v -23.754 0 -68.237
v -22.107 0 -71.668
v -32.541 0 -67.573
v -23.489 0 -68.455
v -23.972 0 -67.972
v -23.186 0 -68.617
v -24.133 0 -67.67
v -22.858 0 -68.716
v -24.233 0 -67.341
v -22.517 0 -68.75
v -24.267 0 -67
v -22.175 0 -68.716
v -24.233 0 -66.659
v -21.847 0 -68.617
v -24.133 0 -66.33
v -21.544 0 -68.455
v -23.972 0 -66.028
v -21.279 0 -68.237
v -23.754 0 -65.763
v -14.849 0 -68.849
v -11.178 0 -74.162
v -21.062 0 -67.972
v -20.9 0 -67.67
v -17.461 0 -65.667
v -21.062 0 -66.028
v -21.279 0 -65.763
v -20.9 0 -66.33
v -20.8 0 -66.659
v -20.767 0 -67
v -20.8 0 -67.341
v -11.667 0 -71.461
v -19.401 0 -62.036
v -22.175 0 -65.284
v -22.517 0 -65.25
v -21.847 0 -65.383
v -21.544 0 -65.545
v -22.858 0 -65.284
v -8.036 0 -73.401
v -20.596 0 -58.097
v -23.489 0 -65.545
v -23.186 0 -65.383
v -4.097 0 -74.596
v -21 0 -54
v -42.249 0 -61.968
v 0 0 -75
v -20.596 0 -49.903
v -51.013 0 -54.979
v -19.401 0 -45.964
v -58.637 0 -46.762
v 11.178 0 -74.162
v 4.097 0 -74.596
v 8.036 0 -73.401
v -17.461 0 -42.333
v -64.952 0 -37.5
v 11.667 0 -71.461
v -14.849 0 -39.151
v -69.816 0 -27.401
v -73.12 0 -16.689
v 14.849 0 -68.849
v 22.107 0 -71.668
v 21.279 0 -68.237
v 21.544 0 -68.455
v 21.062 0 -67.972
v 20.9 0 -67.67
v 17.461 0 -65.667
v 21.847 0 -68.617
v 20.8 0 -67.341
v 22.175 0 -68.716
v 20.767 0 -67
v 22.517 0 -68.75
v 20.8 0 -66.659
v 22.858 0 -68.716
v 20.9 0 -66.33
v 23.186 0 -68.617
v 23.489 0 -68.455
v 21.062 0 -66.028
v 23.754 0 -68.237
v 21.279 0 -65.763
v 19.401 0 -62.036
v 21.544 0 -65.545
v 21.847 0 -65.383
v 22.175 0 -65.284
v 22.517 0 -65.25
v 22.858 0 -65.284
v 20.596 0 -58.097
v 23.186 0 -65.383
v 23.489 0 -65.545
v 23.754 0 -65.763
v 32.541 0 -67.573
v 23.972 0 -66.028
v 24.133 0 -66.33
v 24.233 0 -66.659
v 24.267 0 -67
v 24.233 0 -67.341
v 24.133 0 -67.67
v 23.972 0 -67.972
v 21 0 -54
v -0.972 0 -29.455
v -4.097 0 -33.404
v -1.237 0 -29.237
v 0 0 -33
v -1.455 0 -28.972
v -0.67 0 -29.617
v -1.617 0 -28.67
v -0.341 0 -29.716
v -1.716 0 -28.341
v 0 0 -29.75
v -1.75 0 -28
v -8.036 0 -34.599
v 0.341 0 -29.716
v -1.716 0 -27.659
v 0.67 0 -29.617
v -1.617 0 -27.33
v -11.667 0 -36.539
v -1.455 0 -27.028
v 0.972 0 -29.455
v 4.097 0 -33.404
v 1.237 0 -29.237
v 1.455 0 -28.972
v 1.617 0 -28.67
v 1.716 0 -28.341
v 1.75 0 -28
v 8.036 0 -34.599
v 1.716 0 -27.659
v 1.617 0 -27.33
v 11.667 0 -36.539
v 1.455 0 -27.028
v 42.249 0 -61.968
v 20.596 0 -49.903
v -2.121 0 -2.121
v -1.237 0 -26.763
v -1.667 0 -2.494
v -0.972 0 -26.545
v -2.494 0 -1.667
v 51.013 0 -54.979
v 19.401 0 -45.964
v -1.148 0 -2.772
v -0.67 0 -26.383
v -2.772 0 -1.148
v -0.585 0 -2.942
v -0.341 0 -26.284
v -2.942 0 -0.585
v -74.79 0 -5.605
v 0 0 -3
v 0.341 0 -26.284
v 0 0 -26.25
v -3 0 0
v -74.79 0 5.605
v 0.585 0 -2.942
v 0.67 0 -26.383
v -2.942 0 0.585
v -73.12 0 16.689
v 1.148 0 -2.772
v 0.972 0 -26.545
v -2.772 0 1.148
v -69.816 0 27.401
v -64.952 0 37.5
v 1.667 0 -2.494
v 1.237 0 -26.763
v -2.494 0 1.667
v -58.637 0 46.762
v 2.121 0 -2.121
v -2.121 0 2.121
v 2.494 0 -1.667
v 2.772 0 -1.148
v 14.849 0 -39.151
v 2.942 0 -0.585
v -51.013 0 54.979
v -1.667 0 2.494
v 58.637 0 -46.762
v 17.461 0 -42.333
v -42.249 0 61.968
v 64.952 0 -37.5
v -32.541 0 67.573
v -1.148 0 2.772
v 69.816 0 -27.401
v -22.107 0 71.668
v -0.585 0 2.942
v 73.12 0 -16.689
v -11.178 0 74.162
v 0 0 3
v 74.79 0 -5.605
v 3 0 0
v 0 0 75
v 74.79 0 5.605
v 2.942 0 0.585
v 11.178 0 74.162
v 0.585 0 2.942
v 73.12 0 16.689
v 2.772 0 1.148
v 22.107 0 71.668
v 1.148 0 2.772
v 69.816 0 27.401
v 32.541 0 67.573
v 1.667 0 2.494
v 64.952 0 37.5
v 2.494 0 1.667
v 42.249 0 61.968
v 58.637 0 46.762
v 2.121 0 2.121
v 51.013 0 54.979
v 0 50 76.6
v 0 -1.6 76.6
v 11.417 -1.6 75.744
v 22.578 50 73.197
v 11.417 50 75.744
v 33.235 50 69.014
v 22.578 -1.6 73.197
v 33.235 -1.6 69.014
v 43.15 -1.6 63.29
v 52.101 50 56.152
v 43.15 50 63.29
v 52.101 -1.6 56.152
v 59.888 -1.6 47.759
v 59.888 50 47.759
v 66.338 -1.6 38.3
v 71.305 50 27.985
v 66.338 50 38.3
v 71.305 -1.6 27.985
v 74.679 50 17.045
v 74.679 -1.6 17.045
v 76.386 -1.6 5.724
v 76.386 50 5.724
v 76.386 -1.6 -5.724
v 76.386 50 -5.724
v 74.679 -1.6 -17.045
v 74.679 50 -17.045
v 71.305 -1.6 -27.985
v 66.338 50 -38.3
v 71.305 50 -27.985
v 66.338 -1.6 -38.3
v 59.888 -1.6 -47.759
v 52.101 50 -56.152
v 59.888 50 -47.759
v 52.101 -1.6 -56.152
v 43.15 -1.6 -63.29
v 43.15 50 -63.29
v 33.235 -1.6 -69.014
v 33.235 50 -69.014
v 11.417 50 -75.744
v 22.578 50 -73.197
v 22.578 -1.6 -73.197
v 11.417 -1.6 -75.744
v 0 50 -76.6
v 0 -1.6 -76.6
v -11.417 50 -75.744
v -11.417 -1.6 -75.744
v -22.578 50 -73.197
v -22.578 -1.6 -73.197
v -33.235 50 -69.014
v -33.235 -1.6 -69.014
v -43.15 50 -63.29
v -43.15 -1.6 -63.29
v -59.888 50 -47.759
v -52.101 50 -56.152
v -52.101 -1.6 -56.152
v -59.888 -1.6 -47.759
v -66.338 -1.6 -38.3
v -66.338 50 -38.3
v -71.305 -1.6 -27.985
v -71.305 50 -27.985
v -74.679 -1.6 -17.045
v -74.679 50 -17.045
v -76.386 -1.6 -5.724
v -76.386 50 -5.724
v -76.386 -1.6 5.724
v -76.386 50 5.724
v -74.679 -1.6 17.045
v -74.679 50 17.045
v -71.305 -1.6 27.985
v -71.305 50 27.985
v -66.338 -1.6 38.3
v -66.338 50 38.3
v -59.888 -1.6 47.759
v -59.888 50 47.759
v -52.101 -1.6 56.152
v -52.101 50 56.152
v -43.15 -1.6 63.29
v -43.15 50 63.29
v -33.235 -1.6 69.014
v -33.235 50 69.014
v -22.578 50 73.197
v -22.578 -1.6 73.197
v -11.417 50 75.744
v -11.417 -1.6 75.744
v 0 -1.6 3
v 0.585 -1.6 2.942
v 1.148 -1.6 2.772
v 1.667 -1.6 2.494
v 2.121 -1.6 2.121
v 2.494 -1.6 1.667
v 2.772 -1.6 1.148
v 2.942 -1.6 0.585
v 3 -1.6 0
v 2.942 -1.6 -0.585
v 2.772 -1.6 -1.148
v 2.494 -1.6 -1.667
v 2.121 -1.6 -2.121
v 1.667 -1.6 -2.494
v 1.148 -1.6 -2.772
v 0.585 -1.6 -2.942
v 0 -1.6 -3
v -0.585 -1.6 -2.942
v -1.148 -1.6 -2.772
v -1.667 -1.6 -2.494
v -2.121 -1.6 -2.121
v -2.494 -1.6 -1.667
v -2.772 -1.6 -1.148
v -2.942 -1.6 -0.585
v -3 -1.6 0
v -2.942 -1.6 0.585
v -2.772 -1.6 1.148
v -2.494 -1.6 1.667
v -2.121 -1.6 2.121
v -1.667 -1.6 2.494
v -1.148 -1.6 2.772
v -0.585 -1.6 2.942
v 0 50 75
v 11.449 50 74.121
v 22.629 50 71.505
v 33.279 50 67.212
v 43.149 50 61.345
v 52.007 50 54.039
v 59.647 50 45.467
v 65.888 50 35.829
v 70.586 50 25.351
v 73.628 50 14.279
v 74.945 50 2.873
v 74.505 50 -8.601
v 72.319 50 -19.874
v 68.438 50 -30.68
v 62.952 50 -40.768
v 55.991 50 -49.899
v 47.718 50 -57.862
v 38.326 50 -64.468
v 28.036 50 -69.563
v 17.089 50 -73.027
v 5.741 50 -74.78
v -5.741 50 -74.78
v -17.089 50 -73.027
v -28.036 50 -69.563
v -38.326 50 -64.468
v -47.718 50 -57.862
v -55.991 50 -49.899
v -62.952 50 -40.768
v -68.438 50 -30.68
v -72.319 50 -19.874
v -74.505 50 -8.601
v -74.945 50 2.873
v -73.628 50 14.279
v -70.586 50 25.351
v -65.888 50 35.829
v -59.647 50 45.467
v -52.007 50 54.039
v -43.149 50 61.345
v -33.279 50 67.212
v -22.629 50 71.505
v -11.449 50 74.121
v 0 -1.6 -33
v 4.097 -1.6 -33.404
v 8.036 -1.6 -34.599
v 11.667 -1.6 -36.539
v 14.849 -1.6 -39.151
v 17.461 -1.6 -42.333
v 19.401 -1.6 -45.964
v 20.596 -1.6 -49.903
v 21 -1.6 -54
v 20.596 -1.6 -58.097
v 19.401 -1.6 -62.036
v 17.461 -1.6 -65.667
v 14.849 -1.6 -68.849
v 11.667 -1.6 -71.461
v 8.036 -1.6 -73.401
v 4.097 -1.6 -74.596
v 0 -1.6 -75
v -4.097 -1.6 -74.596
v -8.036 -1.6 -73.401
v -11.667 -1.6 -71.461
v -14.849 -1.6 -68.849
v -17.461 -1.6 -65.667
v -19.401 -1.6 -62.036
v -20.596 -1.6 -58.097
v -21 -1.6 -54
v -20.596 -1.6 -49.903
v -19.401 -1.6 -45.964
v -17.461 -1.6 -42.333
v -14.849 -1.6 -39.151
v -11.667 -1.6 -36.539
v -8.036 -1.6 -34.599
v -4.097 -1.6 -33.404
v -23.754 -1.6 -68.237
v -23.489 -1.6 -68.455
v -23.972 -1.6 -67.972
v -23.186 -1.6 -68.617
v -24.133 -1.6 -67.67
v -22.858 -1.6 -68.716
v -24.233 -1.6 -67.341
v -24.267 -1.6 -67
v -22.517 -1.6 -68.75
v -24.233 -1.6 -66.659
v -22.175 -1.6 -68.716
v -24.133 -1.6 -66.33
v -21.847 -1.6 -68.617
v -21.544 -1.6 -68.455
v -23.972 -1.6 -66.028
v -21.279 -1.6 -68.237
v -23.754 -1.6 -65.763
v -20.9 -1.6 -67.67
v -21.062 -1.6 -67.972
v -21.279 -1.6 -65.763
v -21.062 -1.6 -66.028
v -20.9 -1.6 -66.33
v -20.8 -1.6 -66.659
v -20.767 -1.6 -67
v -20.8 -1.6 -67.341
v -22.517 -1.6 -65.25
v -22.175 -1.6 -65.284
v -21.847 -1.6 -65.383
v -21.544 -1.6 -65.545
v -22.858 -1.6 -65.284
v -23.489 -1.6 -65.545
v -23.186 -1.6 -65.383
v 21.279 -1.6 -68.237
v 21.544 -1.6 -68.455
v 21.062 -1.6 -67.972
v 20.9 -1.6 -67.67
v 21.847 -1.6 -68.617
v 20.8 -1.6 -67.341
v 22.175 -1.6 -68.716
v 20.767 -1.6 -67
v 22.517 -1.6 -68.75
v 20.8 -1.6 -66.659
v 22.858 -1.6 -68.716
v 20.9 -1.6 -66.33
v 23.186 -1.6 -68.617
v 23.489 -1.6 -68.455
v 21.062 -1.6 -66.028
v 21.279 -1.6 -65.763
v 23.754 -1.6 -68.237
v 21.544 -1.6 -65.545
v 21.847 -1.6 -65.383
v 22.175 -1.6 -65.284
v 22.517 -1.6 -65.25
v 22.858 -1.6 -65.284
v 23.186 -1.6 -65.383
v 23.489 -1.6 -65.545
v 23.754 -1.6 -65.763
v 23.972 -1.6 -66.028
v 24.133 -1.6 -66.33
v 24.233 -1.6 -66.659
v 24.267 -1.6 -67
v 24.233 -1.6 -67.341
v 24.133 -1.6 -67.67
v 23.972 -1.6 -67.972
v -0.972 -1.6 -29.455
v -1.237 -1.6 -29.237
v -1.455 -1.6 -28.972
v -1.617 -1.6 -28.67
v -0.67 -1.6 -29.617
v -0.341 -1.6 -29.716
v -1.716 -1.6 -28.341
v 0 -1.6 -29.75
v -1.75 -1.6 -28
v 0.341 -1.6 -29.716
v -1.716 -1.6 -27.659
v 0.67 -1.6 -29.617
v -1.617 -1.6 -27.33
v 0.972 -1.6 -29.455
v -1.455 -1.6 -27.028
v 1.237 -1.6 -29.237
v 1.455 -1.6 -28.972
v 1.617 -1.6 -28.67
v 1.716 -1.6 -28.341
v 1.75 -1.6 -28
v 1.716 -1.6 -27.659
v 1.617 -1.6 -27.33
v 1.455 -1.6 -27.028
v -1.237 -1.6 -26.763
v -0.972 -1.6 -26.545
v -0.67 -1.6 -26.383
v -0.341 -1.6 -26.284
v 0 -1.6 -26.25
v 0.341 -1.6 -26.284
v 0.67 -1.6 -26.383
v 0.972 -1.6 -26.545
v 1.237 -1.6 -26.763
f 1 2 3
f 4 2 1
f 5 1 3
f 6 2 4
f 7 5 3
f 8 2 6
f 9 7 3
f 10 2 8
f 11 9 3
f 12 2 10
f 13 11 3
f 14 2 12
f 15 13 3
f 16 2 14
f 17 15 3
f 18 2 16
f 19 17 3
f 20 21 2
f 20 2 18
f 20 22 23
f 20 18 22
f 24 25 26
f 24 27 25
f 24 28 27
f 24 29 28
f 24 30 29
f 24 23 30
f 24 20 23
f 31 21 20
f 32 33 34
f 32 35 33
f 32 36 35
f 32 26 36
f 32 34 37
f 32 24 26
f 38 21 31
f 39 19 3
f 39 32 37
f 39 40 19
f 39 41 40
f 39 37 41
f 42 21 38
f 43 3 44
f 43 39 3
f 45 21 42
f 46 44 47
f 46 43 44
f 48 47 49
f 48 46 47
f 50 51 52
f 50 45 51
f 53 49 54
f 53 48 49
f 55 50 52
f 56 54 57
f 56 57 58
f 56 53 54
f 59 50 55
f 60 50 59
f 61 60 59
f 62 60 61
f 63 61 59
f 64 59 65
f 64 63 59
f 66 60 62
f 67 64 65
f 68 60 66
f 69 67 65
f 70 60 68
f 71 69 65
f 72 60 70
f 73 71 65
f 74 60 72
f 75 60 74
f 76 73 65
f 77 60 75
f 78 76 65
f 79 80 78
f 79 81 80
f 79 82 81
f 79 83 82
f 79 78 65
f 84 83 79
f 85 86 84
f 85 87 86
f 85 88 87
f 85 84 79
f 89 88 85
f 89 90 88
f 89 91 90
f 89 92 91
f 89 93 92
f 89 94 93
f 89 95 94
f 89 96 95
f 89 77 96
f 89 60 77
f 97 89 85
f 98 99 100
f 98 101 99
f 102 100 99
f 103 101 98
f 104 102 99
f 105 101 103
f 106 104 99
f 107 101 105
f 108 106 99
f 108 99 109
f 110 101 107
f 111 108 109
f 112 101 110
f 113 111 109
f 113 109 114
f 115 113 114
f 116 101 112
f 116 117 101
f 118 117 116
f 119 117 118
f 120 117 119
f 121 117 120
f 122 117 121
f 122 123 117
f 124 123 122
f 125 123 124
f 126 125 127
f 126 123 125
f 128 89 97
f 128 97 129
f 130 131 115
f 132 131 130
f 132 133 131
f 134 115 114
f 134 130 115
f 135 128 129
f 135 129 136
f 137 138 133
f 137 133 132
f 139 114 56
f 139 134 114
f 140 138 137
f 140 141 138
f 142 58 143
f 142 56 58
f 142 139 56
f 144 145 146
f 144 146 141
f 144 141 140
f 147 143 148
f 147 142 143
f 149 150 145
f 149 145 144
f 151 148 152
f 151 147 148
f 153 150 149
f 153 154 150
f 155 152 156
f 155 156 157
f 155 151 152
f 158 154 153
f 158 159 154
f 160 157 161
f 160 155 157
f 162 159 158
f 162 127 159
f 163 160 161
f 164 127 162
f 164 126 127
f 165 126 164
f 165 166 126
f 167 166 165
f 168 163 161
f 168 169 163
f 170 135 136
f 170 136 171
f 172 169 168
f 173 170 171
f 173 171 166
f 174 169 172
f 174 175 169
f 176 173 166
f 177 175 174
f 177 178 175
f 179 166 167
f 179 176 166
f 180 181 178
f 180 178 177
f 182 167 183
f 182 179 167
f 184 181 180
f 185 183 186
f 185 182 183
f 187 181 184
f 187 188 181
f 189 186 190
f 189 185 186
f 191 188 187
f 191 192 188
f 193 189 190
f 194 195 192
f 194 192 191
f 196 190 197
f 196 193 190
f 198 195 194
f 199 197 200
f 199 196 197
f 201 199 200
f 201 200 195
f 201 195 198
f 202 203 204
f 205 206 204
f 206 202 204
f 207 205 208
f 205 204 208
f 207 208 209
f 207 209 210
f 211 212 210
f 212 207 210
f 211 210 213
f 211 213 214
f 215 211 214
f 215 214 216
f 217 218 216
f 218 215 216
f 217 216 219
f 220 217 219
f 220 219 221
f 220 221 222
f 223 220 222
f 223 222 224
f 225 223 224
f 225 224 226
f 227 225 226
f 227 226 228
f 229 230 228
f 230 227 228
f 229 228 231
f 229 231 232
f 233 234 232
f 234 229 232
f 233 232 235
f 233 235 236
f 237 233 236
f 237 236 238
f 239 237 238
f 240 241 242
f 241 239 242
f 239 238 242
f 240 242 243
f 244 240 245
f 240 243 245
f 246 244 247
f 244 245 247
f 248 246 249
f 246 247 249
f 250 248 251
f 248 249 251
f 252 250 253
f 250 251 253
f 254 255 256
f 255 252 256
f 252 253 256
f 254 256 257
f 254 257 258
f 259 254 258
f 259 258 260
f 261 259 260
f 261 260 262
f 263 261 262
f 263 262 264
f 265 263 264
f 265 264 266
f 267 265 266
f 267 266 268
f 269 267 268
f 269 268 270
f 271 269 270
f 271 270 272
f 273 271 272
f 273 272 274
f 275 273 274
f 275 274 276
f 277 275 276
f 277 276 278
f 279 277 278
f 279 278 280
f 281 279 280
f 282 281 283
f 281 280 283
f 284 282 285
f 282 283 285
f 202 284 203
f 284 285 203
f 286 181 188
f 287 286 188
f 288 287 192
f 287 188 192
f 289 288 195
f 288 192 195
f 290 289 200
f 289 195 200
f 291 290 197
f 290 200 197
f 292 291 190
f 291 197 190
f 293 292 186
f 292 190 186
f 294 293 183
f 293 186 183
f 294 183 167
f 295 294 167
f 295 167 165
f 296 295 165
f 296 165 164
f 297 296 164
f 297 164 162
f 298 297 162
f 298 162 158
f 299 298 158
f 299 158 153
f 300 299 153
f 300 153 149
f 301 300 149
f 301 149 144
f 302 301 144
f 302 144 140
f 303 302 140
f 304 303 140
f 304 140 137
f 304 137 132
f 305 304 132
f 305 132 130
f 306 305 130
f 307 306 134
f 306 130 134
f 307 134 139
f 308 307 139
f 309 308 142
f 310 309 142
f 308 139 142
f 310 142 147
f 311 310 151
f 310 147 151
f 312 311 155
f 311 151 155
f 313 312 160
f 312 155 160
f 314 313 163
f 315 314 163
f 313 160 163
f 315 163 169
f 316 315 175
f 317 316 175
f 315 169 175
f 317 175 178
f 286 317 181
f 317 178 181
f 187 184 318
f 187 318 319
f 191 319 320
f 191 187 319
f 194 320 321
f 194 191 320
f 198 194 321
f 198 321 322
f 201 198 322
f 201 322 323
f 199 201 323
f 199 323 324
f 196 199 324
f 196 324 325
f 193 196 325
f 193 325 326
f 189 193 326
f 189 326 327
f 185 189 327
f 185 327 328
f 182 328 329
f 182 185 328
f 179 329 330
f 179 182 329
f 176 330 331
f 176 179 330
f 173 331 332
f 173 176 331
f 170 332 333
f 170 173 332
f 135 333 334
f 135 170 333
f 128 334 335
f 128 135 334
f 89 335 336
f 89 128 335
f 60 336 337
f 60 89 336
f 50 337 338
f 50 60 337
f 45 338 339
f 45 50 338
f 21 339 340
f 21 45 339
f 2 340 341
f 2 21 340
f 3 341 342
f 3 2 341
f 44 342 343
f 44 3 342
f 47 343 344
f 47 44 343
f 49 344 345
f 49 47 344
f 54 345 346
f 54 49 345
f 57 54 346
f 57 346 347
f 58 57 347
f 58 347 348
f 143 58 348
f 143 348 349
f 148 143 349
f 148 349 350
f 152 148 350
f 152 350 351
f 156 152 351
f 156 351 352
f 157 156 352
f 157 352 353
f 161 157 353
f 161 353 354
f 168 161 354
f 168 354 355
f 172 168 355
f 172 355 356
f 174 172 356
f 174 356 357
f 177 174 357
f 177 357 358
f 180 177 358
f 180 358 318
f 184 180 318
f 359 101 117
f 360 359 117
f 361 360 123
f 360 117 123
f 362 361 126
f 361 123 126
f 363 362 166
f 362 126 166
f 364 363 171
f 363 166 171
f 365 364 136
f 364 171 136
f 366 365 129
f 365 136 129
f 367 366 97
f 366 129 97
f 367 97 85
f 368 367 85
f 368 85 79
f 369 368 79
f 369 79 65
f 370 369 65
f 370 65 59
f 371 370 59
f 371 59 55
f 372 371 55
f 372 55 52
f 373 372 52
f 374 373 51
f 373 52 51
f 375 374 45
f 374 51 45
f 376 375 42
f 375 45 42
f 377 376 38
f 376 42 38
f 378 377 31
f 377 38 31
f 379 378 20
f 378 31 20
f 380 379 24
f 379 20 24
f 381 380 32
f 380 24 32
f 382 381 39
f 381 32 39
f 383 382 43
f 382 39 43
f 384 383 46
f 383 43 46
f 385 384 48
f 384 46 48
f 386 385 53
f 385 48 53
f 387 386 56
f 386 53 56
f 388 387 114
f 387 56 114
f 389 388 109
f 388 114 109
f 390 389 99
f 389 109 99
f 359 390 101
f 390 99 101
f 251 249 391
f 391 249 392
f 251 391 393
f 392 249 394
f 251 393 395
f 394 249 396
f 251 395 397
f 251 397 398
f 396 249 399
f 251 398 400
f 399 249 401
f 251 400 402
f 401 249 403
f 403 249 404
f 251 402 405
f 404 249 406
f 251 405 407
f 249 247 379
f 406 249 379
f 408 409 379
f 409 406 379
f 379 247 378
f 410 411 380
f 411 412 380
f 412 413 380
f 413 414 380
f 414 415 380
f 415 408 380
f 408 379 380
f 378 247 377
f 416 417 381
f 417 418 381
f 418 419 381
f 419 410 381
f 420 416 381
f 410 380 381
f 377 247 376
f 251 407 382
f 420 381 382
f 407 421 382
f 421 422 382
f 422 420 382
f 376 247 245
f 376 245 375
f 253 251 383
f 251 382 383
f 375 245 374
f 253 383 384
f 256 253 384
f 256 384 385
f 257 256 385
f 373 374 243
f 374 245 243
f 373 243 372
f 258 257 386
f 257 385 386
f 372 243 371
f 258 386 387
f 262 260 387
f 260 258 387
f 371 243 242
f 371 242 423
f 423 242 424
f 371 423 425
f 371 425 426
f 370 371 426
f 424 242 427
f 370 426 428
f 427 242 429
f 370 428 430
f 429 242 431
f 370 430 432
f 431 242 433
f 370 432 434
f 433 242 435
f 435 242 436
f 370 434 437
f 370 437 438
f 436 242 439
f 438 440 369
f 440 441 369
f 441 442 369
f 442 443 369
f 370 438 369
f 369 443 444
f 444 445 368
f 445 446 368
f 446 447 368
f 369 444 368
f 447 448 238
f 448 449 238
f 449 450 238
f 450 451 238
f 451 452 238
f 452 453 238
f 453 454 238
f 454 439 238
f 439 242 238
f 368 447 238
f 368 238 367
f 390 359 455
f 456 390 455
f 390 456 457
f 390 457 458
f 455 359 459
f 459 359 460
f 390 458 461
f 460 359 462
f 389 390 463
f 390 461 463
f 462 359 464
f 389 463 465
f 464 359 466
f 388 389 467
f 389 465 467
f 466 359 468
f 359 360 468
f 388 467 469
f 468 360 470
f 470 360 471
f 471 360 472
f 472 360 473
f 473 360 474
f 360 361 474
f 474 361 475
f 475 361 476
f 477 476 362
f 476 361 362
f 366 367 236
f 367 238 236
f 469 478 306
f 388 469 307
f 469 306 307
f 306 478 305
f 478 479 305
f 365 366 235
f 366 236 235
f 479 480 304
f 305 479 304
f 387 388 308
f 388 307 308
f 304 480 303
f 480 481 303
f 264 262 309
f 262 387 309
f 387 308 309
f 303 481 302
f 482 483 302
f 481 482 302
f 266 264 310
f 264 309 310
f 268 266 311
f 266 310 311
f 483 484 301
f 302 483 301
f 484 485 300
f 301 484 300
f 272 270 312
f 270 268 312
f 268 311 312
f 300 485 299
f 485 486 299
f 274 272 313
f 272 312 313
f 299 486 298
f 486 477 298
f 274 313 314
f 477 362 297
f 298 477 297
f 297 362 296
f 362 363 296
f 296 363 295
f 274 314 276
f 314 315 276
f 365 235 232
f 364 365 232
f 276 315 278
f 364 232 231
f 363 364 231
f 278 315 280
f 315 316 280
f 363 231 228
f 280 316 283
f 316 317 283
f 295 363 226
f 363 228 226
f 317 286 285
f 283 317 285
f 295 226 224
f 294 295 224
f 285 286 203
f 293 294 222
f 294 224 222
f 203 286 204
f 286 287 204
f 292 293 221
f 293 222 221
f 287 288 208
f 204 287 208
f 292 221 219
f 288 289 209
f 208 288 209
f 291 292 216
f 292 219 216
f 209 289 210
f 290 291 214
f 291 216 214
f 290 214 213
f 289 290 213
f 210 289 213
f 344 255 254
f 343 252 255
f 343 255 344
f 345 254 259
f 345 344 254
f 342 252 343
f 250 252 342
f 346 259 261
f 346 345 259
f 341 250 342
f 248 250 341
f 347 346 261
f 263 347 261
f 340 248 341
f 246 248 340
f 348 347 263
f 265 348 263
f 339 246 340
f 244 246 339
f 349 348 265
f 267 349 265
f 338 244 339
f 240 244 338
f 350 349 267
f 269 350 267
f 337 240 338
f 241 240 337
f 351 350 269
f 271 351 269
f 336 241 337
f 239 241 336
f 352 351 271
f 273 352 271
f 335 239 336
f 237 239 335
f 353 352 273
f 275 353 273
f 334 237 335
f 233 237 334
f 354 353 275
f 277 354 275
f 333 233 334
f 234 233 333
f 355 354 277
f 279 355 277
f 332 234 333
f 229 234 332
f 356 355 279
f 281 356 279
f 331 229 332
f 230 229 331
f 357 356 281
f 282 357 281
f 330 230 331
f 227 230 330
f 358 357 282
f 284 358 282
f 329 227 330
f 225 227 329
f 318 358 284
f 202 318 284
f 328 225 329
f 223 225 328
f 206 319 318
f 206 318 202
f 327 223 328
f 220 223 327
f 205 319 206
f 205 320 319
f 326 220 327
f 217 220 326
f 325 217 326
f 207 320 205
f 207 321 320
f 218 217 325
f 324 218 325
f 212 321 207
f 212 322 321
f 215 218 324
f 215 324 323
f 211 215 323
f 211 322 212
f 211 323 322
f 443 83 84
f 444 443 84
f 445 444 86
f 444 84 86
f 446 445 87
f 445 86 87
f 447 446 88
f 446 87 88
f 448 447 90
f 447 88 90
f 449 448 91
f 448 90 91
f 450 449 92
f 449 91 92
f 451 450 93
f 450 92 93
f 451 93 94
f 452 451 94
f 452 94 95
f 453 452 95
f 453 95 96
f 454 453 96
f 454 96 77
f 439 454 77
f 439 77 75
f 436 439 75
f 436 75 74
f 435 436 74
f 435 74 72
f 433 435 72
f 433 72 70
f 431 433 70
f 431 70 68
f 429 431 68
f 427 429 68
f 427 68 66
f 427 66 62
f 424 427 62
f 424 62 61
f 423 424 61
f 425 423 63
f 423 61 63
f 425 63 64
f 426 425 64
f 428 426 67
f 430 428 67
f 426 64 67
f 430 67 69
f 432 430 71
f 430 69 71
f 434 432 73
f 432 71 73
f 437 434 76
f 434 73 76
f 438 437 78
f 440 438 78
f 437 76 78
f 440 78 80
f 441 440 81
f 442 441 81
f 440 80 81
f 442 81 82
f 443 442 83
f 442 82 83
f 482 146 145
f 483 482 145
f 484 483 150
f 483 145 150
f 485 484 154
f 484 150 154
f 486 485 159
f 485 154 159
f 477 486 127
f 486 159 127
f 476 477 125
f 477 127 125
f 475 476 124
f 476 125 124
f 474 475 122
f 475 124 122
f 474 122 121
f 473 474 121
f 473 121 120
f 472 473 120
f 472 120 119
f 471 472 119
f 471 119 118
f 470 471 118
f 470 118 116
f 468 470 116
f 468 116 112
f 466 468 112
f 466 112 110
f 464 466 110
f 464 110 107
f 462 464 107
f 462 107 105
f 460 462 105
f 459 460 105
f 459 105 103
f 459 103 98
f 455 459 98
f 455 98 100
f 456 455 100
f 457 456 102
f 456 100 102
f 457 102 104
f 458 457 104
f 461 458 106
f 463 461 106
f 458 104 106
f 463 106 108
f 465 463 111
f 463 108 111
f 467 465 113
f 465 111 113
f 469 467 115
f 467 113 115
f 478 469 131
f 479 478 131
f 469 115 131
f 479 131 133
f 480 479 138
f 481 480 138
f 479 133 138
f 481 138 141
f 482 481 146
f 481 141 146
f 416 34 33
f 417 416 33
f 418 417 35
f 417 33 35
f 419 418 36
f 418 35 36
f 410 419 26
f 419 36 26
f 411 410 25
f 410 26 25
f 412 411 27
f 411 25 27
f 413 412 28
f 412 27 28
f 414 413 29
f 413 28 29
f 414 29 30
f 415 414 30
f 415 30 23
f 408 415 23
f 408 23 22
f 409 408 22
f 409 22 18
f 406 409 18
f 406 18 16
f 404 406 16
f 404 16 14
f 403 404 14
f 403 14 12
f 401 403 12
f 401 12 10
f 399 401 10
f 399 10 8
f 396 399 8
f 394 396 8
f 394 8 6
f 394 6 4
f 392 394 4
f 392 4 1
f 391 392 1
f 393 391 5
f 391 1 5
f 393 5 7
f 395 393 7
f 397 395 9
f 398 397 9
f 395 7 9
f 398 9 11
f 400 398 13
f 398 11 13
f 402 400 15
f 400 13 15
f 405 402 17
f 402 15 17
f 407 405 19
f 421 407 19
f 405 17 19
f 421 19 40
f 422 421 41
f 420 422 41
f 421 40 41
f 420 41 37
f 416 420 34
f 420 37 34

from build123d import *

# Parameters (mm, degrees)
SKETCH1_R           = 75
BOSS_EXTRUDE1_DEPTH = 50
SHELL1_T            = 1.6
SKETCH2_R           = 21
CUT_EXTRUDE1_DEPTH  = 50
SKETCH3_R           = 1.75
CUT_EXTRUDE2_DEPTH  = 50
SKETCH4_R           = 3
CUT_EXTRUDE3_DEPTH  = 50


with BuildPart() as part:
    # Sketch1 → Boss-Extrude1 (new body)
    with BuildSketch(Plane(origin=(0, 0, 0), x_dir=(1, 0, 0), z_dir=(0, 1, 0))):
        with Locations(Location((0, 0, 0), (0, 0, 270))):
            Circle(SKETCH1_R)
    extrude(amount=BOSS_EXTRUDE1_DEPTH)

    # Shell1
    shell1_openings = [part.faces().sort_by_distance(p)[0] for p in [
        (0, 50, 0),
    ]]
    offset(amount=SHELL1_T, openings=shell1_openings, kind=Kind.INTERSECTION)

    # Sketch2 → Cut-Extrude1 (cut)
    with BuildSketch(Plane(origin=(0, 0, 0), x_dir=(1, 0, 0), z_dir=(0, 1, 0))):
        with Locations(Location((0, 54, 0), (0, 0, 270))):
            Circle(SKETCH2_R)
    extrude(amount=-CUT_EXTRUDE1_DEPTH, mode=Mode.SUBTRACT)

    # Sketch3 → Cut-Extrude2 (cut)
    with BuildSketch(Plane(origin=(0, 0, 0), x_dir=(1, 0, 0), z_dir=(0, 1, 0))):
        with Locations(Location((0, 28, 0), (0, 0, 270))):
            Circle(SKETCH3_R)
        with Locations(Location((-22.516660498, 67, 0), (0, 0, 270))):
            Circle(SKETCH3_R)
        with Locations(Location((22.516660498, 67, 0), (0, 0, 270))):
            Circle(SKETCH3_R)
    extrude(amount=-CUT_EXTRUDE2_DEPTH, mode=Mode.SUBTRACT)

    # Sketch4 → Cut-Extrude3 (cut)
    with BuildSketch(Plane(origin=(0, 0, 0), x_dir=(1, 0, 0), z_dir=(0, 1, 0))):
        with Locations(Location((0, 0, 0), (0, 0, 270))):
            Circle(SKETCH4_R)
    extrude(amount=-CUT_EXTRUDE3_DEPTH, mode=Mode.SUBTRACT)


solid = part.part
